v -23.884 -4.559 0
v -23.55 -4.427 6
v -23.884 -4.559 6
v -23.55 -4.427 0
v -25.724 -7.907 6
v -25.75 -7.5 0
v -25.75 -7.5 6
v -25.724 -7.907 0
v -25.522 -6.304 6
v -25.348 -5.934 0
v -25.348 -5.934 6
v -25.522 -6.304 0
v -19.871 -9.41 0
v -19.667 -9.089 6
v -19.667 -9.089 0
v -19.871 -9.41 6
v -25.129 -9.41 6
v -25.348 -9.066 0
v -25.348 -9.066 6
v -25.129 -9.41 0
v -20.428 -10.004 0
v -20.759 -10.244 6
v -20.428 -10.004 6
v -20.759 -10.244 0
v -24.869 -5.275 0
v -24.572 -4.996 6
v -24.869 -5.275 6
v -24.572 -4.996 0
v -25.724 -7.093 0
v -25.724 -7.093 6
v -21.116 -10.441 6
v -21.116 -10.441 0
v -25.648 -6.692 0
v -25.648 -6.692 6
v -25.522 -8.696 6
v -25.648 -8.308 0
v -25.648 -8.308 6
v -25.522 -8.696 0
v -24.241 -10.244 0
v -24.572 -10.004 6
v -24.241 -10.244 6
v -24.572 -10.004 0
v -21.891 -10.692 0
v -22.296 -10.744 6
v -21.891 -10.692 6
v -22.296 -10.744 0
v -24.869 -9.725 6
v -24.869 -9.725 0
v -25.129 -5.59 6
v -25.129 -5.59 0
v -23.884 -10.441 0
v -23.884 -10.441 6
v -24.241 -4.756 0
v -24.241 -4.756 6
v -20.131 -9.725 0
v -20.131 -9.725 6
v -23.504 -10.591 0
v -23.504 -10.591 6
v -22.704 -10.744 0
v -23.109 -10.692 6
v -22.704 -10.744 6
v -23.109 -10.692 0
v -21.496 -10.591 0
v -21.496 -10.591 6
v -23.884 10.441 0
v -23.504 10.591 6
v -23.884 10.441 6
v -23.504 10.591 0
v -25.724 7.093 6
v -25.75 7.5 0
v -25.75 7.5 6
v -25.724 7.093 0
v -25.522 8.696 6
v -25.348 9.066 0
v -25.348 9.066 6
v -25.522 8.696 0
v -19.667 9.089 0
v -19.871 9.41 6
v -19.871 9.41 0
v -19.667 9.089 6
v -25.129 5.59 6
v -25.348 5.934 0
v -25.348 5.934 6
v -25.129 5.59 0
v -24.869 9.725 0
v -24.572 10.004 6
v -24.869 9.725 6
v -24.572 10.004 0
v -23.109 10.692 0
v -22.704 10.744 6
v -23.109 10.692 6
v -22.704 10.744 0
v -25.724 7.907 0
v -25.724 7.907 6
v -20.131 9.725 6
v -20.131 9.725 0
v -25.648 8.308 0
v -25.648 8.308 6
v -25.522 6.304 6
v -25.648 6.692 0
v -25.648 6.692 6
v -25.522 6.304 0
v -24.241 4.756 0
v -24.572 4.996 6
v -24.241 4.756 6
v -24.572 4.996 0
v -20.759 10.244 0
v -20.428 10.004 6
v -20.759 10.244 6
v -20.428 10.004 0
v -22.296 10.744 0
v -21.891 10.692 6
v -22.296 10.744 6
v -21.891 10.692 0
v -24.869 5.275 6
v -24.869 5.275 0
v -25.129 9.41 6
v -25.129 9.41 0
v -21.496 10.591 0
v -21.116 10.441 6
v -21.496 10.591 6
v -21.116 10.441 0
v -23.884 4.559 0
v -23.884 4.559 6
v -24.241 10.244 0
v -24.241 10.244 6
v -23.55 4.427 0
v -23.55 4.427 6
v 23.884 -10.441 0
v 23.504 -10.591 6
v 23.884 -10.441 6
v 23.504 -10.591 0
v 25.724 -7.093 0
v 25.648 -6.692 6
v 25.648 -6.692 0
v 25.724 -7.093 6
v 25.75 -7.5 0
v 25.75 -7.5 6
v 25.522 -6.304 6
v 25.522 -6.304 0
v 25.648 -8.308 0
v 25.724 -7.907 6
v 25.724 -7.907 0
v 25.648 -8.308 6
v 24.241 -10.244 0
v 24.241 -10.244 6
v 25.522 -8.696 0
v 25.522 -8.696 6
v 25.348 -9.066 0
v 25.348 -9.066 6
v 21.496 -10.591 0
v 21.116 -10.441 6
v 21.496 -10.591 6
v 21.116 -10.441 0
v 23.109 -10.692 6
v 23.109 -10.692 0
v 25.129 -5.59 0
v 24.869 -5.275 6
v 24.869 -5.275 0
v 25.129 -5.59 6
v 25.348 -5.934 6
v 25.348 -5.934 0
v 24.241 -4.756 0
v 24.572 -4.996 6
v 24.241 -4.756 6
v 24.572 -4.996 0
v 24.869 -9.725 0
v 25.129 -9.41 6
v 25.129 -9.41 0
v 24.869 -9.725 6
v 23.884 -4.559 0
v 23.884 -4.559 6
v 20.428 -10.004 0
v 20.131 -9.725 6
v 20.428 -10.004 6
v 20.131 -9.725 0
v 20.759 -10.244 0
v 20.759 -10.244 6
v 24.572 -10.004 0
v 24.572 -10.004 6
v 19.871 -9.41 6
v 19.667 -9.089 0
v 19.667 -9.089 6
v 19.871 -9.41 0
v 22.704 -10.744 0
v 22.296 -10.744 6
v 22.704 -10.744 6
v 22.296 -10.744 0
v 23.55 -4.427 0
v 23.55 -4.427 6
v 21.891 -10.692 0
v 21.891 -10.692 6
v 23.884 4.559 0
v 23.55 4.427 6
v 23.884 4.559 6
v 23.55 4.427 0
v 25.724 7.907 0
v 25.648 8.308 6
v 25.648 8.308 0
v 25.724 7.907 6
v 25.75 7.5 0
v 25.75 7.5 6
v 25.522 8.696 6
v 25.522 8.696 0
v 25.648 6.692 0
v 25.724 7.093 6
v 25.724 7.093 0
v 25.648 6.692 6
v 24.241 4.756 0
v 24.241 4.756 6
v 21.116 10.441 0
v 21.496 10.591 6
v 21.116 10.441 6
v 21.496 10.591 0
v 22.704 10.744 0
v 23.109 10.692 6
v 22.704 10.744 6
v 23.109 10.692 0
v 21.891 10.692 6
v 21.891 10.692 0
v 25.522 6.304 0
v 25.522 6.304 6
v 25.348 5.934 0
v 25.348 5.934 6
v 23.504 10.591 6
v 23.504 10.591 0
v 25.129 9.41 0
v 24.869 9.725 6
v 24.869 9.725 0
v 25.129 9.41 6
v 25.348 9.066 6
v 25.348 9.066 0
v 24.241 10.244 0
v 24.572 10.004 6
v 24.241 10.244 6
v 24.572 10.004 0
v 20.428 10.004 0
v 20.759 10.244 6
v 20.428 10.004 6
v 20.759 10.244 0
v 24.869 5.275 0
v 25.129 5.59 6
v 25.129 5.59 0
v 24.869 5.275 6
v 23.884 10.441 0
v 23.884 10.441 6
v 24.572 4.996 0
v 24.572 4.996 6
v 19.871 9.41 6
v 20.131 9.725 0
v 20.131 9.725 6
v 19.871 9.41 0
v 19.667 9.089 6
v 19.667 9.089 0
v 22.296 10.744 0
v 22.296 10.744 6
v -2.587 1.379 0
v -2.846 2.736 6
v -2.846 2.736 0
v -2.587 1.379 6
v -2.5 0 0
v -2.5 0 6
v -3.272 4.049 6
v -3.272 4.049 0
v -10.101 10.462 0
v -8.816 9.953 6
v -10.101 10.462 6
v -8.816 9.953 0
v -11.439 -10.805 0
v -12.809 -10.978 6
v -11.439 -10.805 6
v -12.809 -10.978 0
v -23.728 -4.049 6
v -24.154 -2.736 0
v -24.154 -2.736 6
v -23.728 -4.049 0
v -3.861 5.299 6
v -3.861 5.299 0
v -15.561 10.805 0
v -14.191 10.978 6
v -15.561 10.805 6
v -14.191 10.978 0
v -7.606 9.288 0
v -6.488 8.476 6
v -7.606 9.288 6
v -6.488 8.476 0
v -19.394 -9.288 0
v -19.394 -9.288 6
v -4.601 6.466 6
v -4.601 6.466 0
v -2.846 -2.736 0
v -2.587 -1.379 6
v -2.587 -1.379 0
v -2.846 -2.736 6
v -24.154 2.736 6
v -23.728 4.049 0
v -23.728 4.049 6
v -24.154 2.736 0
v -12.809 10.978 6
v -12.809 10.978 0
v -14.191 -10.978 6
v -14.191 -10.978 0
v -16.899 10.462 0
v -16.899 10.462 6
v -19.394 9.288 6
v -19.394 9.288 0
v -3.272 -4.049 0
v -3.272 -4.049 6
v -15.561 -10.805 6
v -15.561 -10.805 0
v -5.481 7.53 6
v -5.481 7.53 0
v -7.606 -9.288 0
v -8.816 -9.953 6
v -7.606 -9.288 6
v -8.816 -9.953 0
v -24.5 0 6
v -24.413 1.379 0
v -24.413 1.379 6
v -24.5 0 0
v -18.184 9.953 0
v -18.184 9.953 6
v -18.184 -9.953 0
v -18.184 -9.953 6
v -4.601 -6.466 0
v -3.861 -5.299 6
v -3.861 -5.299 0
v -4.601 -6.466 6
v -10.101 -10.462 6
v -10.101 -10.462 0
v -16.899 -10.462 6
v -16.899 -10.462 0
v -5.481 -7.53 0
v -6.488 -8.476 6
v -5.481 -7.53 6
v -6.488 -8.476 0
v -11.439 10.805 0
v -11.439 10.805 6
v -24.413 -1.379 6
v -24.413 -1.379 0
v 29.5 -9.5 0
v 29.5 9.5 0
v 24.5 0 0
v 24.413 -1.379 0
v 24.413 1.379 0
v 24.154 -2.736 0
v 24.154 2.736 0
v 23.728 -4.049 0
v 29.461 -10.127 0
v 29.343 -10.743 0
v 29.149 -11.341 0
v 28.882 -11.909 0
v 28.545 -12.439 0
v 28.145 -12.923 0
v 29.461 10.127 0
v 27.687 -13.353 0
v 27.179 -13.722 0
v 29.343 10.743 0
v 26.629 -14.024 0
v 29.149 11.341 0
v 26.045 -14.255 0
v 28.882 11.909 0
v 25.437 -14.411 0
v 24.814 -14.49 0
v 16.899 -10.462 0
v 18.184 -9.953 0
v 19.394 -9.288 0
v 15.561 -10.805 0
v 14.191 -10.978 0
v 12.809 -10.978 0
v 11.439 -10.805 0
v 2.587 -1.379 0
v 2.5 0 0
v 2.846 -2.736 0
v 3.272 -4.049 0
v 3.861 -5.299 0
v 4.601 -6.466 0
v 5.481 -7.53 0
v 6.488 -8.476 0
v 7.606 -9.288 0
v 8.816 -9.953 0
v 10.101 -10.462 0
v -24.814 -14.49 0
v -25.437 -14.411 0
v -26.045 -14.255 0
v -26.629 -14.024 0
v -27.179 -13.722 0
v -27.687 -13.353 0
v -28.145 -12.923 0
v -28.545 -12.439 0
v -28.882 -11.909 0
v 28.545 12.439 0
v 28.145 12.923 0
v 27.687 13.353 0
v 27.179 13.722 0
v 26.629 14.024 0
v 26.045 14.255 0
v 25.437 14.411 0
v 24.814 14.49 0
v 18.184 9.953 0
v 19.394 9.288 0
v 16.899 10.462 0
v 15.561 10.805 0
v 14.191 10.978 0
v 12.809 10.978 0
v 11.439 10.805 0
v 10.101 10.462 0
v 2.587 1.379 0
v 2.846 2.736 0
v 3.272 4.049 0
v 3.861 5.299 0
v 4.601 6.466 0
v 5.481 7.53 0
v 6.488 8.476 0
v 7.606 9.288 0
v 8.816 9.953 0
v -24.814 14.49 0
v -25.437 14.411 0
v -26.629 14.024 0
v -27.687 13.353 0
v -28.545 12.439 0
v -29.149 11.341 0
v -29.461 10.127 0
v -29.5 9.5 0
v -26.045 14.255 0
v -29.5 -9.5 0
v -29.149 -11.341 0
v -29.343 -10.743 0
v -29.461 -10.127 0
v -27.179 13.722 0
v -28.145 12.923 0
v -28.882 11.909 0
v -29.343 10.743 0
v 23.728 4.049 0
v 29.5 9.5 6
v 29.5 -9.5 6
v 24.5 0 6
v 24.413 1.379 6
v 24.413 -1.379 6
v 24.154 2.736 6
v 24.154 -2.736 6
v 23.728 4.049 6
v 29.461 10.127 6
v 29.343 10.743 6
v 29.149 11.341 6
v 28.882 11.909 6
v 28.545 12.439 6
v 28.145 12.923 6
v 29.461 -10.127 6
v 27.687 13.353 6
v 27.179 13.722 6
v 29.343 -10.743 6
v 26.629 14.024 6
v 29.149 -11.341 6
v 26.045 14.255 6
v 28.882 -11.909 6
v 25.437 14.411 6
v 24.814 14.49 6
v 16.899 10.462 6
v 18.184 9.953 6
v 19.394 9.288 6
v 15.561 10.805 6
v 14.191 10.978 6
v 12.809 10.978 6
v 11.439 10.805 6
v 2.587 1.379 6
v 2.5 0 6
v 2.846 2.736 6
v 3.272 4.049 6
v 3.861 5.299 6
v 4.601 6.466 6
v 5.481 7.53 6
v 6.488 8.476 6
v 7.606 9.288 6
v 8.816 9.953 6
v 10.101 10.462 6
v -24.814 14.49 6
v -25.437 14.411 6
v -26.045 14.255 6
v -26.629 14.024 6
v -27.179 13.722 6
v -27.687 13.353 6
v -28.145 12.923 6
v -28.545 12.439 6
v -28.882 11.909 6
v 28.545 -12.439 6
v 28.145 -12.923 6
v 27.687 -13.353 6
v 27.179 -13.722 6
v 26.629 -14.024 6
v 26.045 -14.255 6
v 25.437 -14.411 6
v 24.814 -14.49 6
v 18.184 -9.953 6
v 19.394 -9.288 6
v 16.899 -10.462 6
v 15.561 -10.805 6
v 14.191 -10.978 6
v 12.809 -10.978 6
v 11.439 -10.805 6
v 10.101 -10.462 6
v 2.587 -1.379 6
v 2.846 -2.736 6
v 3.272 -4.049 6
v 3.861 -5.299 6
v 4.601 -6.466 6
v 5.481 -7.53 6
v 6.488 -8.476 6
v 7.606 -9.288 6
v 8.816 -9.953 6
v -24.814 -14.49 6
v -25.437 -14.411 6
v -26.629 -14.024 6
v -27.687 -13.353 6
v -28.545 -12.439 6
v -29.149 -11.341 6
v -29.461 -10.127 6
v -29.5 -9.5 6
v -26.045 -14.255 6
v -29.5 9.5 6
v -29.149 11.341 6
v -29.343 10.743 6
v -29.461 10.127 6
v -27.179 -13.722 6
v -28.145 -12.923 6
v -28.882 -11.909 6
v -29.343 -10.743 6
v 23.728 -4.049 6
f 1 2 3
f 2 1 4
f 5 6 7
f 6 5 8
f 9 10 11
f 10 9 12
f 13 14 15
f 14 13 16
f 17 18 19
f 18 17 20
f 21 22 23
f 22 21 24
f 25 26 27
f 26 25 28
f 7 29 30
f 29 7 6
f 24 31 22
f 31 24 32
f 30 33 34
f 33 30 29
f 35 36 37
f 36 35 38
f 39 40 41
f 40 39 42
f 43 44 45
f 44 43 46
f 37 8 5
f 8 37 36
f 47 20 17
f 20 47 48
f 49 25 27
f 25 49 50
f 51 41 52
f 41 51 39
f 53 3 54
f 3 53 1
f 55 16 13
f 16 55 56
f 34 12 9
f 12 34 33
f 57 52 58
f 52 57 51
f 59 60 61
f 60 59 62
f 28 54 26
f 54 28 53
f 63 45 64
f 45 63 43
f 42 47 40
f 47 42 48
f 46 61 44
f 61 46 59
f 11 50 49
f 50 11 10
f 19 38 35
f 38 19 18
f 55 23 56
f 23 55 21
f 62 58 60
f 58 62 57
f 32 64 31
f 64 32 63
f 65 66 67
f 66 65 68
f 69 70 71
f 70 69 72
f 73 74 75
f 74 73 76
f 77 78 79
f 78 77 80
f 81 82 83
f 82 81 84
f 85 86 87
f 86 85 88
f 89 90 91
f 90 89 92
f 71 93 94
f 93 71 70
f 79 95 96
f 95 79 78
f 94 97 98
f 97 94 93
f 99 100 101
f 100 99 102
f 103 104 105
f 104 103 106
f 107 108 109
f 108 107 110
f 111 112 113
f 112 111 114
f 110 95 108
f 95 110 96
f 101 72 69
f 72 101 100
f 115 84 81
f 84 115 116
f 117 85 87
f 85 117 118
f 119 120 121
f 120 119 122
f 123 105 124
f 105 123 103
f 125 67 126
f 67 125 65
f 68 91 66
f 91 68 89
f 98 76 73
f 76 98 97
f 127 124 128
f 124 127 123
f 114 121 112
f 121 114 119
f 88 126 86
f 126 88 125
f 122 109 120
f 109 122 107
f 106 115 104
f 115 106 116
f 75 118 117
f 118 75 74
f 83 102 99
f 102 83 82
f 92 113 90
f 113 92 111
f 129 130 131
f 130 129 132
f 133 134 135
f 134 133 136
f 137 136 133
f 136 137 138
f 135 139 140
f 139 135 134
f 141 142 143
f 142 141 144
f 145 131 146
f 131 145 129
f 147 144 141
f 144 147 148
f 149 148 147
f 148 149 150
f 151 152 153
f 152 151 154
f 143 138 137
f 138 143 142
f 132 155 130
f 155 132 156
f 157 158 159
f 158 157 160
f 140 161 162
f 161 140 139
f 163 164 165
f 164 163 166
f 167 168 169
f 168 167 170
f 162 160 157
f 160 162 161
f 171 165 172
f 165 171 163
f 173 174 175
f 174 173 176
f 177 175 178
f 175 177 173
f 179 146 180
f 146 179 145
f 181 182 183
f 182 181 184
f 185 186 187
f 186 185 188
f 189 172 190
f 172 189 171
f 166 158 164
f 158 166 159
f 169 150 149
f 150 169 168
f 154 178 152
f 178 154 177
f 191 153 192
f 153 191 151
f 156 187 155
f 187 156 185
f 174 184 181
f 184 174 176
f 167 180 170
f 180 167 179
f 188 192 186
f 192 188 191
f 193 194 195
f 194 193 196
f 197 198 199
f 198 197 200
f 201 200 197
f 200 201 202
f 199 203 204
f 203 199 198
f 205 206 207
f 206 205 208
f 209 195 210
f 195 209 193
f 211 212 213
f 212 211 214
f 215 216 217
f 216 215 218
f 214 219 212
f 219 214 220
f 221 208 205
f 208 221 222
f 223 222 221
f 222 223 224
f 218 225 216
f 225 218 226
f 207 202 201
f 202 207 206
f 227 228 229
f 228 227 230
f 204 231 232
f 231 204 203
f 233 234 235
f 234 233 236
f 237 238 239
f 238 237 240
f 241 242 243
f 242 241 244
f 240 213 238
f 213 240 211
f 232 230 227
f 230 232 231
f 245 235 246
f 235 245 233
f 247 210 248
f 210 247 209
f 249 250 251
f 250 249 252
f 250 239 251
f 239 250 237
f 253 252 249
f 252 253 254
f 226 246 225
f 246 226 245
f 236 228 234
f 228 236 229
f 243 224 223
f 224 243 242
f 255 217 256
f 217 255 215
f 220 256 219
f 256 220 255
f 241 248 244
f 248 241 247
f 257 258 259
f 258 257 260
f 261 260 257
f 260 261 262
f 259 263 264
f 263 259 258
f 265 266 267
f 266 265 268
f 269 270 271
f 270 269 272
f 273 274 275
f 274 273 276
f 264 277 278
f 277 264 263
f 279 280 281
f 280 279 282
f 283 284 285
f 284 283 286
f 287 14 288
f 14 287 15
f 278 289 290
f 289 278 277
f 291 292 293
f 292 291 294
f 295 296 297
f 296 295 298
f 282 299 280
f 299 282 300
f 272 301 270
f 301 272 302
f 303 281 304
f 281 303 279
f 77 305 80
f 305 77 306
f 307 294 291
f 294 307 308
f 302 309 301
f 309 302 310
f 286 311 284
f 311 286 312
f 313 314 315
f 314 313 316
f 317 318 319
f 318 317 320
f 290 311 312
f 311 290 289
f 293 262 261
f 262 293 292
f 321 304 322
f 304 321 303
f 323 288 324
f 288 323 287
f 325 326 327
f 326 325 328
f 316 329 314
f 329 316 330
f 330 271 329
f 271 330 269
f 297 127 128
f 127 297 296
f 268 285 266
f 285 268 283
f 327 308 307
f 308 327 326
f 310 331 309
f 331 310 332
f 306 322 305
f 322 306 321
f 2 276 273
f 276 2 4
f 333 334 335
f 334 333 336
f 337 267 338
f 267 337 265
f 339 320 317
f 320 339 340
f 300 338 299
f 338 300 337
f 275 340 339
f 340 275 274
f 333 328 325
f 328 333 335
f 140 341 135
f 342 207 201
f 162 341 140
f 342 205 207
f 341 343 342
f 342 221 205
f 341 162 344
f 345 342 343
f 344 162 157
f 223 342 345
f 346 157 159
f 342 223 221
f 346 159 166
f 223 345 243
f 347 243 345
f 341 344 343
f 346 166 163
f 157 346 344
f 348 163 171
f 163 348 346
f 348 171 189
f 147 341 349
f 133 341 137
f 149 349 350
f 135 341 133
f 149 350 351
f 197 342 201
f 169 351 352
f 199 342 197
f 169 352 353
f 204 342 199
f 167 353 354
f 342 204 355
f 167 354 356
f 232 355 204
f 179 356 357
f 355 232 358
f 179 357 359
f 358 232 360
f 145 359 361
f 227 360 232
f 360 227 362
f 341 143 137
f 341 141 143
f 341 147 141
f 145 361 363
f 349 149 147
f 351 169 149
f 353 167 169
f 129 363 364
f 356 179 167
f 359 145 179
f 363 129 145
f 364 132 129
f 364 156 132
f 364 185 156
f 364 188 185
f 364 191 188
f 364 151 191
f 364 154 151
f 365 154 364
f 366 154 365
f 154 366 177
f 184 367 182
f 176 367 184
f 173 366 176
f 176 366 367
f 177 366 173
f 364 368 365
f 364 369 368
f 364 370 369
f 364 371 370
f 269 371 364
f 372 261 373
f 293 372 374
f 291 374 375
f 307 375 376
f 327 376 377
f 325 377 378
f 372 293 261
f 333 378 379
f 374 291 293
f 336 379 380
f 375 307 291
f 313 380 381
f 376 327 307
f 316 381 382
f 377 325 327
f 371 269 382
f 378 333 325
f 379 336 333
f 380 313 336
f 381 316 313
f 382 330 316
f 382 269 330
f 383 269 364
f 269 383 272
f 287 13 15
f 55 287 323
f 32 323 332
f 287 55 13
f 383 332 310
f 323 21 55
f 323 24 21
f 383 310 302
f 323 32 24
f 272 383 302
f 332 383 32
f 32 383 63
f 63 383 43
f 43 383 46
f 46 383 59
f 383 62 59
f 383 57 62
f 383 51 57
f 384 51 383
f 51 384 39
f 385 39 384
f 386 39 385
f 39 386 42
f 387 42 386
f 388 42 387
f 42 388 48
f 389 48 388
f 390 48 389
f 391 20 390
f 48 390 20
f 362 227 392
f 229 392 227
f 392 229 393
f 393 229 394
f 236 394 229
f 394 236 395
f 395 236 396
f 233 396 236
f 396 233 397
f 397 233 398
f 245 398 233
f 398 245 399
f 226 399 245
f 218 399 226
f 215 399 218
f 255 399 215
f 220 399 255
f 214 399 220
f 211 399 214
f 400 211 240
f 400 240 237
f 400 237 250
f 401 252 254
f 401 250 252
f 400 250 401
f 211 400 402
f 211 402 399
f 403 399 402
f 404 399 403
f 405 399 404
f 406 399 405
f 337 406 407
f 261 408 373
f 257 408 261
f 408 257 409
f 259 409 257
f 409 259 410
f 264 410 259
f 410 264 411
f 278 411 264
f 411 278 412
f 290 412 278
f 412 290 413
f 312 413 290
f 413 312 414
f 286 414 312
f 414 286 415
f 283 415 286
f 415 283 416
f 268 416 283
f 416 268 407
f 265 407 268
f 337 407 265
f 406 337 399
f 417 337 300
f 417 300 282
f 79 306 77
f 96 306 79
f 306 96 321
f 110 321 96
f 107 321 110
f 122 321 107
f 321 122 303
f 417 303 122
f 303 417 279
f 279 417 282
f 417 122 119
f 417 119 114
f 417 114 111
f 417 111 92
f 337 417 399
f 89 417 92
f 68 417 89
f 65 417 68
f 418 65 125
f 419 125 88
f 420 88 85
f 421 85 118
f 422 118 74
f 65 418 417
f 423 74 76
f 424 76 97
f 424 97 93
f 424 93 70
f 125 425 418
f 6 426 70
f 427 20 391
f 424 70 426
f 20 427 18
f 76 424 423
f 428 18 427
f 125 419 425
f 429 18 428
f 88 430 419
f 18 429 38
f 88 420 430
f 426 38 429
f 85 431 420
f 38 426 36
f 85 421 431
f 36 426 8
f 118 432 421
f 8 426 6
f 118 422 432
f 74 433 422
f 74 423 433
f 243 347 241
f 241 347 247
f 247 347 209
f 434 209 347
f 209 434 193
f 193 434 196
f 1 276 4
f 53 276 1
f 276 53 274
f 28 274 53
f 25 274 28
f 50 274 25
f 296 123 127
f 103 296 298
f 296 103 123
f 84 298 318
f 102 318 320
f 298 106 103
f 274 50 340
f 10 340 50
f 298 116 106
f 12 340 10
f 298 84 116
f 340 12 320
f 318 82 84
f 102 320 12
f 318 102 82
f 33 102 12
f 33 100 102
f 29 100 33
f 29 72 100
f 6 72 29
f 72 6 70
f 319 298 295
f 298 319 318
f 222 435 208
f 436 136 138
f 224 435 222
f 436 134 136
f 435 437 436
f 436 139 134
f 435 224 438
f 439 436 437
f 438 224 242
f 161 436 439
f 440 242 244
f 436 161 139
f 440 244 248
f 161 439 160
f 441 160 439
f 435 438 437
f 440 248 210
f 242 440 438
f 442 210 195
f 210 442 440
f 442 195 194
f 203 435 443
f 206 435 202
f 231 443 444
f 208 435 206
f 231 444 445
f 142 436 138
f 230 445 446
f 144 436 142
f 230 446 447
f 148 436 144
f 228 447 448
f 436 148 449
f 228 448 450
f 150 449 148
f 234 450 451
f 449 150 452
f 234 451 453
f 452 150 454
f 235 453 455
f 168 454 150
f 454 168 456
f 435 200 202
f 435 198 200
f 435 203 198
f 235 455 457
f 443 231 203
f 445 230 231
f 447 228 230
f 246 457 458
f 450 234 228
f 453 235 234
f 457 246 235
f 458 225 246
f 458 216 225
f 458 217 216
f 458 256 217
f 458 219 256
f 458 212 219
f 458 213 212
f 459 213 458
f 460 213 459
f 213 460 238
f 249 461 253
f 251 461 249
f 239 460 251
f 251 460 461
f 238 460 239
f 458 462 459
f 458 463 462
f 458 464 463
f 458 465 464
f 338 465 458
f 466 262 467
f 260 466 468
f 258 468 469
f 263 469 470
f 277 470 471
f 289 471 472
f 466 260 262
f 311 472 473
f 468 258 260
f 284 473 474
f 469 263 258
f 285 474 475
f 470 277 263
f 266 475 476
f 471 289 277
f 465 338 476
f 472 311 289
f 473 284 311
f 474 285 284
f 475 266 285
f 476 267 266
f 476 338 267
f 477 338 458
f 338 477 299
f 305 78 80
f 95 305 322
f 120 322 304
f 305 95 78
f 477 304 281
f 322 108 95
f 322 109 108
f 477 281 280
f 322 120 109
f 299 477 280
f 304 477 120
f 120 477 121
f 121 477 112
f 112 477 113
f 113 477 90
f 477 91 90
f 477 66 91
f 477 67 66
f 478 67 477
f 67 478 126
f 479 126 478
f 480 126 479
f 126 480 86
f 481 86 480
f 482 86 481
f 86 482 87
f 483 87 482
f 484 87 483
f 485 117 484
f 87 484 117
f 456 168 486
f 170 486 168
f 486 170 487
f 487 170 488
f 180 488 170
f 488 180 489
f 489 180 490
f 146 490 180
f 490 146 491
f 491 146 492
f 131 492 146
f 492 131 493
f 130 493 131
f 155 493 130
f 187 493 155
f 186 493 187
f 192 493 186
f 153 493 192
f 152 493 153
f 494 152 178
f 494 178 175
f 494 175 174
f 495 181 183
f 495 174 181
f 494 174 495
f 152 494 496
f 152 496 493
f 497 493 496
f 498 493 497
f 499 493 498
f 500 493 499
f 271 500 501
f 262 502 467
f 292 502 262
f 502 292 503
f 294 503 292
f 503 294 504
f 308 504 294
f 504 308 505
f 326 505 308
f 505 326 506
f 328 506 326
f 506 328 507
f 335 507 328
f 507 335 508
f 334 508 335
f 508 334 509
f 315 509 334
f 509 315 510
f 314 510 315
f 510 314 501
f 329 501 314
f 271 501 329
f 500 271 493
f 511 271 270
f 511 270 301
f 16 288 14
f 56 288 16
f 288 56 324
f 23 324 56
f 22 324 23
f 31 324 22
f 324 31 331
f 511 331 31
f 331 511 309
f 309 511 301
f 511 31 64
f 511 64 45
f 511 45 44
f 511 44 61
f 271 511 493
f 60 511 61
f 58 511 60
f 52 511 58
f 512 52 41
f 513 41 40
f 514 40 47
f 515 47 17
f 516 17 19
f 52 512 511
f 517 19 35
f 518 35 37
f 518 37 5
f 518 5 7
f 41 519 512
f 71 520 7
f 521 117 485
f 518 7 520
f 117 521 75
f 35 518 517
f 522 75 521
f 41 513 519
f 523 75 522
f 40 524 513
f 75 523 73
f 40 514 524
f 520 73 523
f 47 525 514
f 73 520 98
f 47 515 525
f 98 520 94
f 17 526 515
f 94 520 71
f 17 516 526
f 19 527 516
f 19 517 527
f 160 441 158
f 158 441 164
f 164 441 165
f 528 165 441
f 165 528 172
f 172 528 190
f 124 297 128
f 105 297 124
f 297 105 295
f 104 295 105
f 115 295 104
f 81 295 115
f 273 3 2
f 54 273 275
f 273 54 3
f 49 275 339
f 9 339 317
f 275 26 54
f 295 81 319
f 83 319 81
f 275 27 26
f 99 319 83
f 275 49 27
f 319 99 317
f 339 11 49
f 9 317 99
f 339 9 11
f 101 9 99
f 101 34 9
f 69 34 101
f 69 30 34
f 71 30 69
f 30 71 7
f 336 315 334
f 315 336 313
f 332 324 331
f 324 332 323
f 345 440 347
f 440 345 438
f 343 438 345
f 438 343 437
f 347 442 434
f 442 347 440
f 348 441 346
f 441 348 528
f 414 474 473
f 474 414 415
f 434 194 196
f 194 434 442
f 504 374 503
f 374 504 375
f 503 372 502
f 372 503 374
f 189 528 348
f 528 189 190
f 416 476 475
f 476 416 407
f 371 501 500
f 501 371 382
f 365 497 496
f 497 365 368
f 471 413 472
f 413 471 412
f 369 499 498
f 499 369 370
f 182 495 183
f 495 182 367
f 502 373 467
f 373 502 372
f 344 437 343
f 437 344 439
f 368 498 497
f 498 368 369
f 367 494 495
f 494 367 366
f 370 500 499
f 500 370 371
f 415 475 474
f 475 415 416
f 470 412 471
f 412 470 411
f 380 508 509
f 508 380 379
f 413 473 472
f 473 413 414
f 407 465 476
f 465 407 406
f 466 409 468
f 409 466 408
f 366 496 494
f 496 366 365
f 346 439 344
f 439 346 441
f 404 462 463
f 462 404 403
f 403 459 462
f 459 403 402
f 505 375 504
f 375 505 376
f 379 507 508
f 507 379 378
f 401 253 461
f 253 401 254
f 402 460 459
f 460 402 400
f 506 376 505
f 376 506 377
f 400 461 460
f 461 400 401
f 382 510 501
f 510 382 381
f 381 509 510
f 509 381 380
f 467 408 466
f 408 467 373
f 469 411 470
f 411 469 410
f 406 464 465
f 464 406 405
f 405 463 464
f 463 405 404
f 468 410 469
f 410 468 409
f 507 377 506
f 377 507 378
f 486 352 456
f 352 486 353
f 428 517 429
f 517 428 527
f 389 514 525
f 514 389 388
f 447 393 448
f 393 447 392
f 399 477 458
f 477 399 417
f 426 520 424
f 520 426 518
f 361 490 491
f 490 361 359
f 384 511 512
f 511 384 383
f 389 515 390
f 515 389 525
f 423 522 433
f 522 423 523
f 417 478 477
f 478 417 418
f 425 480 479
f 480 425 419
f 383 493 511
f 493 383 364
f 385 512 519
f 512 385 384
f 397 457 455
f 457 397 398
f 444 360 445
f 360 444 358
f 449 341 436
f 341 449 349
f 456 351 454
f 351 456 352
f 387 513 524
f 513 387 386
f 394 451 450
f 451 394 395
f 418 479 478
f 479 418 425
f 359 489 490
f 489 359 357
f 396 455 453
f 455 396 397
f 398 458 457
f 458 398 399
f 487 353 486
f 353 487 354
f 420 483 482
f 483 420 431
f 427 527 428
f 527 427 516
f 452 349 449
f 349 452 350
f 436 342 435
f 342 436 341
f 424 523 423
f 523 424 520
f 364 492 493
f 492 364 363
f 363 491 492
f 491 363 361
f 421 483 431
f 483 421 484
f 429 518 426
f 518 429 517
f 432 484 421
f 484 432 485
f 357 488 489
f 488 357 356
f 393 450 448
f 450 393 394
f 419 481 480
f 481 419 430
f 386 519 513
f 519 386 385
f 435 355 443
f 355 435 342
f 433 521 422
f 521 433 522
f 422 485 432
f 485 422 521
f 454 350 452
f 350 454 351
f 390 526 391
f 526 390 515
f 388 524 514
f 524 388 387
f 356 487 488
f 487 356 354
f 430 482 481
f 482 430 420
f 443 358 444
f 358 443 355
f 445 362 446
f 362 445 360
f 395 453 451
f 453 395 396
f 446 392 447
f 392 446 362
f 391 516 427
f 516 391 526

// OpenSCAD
$fn = 50;

difference() {
	union() {
		hull() {
			translate(v = [-24.5, 9.5, 0]) {
				cylinder(h = 6, r = 5);
			}
			translate(v = [24.5, 9.5, 0]) {
				cylinder(h = 6, r = 5);
			}
			translate(v = [-24.5, -9.5, 0]) {
				cylinder(h = 6, r = 5);
			}
			translate(v = [24.5, -9.5, 0]) {
				cylinder(h = 6, r = 5);
			}
		}
	}
	union() {
		translate(v = [-22.5, -7.5, -100.0]) {
			cylinder(h = 200, r = 3.25);
		}
		translate(v = [-22.5, 7.5, -100.0]) {
			cylinder(h = 200, r = 3.25);
		}
		translate(v = [22.5, -7.5, -100.0]) {
			cylinder(h = 200, r = 3.25);
		}
		translate(v = [22.5, 7.5, -100.0]) {
			cylinder(h = 200, r = 3.25);
		}
		translate(v = [-22.5, -7.5, -100.0]) {
			cylinder(h = 200, r = 1.8);
		}
		translate(v = [-22.5, 7.5, -100.0]) {
			cylinder(h = 200, r = 1.8);
		}
		translate(v = [22.5, -7.5, -100.0]) {
			cylinder(h = 200, r = 1.8);
		}
		translate(v = [22.5, 7.5, -100.0]) {
			cylinder(h = 200, r = 1.8);
		}
		translate(v = [-13.5, 0, 0.0]) {
			cylinder(h = 6, r = 11.0);
		}
		translate(v = [13.5, 0, 0.0]) {
			cylinder(h = 6, r = 11.0);
		}
	}
}
